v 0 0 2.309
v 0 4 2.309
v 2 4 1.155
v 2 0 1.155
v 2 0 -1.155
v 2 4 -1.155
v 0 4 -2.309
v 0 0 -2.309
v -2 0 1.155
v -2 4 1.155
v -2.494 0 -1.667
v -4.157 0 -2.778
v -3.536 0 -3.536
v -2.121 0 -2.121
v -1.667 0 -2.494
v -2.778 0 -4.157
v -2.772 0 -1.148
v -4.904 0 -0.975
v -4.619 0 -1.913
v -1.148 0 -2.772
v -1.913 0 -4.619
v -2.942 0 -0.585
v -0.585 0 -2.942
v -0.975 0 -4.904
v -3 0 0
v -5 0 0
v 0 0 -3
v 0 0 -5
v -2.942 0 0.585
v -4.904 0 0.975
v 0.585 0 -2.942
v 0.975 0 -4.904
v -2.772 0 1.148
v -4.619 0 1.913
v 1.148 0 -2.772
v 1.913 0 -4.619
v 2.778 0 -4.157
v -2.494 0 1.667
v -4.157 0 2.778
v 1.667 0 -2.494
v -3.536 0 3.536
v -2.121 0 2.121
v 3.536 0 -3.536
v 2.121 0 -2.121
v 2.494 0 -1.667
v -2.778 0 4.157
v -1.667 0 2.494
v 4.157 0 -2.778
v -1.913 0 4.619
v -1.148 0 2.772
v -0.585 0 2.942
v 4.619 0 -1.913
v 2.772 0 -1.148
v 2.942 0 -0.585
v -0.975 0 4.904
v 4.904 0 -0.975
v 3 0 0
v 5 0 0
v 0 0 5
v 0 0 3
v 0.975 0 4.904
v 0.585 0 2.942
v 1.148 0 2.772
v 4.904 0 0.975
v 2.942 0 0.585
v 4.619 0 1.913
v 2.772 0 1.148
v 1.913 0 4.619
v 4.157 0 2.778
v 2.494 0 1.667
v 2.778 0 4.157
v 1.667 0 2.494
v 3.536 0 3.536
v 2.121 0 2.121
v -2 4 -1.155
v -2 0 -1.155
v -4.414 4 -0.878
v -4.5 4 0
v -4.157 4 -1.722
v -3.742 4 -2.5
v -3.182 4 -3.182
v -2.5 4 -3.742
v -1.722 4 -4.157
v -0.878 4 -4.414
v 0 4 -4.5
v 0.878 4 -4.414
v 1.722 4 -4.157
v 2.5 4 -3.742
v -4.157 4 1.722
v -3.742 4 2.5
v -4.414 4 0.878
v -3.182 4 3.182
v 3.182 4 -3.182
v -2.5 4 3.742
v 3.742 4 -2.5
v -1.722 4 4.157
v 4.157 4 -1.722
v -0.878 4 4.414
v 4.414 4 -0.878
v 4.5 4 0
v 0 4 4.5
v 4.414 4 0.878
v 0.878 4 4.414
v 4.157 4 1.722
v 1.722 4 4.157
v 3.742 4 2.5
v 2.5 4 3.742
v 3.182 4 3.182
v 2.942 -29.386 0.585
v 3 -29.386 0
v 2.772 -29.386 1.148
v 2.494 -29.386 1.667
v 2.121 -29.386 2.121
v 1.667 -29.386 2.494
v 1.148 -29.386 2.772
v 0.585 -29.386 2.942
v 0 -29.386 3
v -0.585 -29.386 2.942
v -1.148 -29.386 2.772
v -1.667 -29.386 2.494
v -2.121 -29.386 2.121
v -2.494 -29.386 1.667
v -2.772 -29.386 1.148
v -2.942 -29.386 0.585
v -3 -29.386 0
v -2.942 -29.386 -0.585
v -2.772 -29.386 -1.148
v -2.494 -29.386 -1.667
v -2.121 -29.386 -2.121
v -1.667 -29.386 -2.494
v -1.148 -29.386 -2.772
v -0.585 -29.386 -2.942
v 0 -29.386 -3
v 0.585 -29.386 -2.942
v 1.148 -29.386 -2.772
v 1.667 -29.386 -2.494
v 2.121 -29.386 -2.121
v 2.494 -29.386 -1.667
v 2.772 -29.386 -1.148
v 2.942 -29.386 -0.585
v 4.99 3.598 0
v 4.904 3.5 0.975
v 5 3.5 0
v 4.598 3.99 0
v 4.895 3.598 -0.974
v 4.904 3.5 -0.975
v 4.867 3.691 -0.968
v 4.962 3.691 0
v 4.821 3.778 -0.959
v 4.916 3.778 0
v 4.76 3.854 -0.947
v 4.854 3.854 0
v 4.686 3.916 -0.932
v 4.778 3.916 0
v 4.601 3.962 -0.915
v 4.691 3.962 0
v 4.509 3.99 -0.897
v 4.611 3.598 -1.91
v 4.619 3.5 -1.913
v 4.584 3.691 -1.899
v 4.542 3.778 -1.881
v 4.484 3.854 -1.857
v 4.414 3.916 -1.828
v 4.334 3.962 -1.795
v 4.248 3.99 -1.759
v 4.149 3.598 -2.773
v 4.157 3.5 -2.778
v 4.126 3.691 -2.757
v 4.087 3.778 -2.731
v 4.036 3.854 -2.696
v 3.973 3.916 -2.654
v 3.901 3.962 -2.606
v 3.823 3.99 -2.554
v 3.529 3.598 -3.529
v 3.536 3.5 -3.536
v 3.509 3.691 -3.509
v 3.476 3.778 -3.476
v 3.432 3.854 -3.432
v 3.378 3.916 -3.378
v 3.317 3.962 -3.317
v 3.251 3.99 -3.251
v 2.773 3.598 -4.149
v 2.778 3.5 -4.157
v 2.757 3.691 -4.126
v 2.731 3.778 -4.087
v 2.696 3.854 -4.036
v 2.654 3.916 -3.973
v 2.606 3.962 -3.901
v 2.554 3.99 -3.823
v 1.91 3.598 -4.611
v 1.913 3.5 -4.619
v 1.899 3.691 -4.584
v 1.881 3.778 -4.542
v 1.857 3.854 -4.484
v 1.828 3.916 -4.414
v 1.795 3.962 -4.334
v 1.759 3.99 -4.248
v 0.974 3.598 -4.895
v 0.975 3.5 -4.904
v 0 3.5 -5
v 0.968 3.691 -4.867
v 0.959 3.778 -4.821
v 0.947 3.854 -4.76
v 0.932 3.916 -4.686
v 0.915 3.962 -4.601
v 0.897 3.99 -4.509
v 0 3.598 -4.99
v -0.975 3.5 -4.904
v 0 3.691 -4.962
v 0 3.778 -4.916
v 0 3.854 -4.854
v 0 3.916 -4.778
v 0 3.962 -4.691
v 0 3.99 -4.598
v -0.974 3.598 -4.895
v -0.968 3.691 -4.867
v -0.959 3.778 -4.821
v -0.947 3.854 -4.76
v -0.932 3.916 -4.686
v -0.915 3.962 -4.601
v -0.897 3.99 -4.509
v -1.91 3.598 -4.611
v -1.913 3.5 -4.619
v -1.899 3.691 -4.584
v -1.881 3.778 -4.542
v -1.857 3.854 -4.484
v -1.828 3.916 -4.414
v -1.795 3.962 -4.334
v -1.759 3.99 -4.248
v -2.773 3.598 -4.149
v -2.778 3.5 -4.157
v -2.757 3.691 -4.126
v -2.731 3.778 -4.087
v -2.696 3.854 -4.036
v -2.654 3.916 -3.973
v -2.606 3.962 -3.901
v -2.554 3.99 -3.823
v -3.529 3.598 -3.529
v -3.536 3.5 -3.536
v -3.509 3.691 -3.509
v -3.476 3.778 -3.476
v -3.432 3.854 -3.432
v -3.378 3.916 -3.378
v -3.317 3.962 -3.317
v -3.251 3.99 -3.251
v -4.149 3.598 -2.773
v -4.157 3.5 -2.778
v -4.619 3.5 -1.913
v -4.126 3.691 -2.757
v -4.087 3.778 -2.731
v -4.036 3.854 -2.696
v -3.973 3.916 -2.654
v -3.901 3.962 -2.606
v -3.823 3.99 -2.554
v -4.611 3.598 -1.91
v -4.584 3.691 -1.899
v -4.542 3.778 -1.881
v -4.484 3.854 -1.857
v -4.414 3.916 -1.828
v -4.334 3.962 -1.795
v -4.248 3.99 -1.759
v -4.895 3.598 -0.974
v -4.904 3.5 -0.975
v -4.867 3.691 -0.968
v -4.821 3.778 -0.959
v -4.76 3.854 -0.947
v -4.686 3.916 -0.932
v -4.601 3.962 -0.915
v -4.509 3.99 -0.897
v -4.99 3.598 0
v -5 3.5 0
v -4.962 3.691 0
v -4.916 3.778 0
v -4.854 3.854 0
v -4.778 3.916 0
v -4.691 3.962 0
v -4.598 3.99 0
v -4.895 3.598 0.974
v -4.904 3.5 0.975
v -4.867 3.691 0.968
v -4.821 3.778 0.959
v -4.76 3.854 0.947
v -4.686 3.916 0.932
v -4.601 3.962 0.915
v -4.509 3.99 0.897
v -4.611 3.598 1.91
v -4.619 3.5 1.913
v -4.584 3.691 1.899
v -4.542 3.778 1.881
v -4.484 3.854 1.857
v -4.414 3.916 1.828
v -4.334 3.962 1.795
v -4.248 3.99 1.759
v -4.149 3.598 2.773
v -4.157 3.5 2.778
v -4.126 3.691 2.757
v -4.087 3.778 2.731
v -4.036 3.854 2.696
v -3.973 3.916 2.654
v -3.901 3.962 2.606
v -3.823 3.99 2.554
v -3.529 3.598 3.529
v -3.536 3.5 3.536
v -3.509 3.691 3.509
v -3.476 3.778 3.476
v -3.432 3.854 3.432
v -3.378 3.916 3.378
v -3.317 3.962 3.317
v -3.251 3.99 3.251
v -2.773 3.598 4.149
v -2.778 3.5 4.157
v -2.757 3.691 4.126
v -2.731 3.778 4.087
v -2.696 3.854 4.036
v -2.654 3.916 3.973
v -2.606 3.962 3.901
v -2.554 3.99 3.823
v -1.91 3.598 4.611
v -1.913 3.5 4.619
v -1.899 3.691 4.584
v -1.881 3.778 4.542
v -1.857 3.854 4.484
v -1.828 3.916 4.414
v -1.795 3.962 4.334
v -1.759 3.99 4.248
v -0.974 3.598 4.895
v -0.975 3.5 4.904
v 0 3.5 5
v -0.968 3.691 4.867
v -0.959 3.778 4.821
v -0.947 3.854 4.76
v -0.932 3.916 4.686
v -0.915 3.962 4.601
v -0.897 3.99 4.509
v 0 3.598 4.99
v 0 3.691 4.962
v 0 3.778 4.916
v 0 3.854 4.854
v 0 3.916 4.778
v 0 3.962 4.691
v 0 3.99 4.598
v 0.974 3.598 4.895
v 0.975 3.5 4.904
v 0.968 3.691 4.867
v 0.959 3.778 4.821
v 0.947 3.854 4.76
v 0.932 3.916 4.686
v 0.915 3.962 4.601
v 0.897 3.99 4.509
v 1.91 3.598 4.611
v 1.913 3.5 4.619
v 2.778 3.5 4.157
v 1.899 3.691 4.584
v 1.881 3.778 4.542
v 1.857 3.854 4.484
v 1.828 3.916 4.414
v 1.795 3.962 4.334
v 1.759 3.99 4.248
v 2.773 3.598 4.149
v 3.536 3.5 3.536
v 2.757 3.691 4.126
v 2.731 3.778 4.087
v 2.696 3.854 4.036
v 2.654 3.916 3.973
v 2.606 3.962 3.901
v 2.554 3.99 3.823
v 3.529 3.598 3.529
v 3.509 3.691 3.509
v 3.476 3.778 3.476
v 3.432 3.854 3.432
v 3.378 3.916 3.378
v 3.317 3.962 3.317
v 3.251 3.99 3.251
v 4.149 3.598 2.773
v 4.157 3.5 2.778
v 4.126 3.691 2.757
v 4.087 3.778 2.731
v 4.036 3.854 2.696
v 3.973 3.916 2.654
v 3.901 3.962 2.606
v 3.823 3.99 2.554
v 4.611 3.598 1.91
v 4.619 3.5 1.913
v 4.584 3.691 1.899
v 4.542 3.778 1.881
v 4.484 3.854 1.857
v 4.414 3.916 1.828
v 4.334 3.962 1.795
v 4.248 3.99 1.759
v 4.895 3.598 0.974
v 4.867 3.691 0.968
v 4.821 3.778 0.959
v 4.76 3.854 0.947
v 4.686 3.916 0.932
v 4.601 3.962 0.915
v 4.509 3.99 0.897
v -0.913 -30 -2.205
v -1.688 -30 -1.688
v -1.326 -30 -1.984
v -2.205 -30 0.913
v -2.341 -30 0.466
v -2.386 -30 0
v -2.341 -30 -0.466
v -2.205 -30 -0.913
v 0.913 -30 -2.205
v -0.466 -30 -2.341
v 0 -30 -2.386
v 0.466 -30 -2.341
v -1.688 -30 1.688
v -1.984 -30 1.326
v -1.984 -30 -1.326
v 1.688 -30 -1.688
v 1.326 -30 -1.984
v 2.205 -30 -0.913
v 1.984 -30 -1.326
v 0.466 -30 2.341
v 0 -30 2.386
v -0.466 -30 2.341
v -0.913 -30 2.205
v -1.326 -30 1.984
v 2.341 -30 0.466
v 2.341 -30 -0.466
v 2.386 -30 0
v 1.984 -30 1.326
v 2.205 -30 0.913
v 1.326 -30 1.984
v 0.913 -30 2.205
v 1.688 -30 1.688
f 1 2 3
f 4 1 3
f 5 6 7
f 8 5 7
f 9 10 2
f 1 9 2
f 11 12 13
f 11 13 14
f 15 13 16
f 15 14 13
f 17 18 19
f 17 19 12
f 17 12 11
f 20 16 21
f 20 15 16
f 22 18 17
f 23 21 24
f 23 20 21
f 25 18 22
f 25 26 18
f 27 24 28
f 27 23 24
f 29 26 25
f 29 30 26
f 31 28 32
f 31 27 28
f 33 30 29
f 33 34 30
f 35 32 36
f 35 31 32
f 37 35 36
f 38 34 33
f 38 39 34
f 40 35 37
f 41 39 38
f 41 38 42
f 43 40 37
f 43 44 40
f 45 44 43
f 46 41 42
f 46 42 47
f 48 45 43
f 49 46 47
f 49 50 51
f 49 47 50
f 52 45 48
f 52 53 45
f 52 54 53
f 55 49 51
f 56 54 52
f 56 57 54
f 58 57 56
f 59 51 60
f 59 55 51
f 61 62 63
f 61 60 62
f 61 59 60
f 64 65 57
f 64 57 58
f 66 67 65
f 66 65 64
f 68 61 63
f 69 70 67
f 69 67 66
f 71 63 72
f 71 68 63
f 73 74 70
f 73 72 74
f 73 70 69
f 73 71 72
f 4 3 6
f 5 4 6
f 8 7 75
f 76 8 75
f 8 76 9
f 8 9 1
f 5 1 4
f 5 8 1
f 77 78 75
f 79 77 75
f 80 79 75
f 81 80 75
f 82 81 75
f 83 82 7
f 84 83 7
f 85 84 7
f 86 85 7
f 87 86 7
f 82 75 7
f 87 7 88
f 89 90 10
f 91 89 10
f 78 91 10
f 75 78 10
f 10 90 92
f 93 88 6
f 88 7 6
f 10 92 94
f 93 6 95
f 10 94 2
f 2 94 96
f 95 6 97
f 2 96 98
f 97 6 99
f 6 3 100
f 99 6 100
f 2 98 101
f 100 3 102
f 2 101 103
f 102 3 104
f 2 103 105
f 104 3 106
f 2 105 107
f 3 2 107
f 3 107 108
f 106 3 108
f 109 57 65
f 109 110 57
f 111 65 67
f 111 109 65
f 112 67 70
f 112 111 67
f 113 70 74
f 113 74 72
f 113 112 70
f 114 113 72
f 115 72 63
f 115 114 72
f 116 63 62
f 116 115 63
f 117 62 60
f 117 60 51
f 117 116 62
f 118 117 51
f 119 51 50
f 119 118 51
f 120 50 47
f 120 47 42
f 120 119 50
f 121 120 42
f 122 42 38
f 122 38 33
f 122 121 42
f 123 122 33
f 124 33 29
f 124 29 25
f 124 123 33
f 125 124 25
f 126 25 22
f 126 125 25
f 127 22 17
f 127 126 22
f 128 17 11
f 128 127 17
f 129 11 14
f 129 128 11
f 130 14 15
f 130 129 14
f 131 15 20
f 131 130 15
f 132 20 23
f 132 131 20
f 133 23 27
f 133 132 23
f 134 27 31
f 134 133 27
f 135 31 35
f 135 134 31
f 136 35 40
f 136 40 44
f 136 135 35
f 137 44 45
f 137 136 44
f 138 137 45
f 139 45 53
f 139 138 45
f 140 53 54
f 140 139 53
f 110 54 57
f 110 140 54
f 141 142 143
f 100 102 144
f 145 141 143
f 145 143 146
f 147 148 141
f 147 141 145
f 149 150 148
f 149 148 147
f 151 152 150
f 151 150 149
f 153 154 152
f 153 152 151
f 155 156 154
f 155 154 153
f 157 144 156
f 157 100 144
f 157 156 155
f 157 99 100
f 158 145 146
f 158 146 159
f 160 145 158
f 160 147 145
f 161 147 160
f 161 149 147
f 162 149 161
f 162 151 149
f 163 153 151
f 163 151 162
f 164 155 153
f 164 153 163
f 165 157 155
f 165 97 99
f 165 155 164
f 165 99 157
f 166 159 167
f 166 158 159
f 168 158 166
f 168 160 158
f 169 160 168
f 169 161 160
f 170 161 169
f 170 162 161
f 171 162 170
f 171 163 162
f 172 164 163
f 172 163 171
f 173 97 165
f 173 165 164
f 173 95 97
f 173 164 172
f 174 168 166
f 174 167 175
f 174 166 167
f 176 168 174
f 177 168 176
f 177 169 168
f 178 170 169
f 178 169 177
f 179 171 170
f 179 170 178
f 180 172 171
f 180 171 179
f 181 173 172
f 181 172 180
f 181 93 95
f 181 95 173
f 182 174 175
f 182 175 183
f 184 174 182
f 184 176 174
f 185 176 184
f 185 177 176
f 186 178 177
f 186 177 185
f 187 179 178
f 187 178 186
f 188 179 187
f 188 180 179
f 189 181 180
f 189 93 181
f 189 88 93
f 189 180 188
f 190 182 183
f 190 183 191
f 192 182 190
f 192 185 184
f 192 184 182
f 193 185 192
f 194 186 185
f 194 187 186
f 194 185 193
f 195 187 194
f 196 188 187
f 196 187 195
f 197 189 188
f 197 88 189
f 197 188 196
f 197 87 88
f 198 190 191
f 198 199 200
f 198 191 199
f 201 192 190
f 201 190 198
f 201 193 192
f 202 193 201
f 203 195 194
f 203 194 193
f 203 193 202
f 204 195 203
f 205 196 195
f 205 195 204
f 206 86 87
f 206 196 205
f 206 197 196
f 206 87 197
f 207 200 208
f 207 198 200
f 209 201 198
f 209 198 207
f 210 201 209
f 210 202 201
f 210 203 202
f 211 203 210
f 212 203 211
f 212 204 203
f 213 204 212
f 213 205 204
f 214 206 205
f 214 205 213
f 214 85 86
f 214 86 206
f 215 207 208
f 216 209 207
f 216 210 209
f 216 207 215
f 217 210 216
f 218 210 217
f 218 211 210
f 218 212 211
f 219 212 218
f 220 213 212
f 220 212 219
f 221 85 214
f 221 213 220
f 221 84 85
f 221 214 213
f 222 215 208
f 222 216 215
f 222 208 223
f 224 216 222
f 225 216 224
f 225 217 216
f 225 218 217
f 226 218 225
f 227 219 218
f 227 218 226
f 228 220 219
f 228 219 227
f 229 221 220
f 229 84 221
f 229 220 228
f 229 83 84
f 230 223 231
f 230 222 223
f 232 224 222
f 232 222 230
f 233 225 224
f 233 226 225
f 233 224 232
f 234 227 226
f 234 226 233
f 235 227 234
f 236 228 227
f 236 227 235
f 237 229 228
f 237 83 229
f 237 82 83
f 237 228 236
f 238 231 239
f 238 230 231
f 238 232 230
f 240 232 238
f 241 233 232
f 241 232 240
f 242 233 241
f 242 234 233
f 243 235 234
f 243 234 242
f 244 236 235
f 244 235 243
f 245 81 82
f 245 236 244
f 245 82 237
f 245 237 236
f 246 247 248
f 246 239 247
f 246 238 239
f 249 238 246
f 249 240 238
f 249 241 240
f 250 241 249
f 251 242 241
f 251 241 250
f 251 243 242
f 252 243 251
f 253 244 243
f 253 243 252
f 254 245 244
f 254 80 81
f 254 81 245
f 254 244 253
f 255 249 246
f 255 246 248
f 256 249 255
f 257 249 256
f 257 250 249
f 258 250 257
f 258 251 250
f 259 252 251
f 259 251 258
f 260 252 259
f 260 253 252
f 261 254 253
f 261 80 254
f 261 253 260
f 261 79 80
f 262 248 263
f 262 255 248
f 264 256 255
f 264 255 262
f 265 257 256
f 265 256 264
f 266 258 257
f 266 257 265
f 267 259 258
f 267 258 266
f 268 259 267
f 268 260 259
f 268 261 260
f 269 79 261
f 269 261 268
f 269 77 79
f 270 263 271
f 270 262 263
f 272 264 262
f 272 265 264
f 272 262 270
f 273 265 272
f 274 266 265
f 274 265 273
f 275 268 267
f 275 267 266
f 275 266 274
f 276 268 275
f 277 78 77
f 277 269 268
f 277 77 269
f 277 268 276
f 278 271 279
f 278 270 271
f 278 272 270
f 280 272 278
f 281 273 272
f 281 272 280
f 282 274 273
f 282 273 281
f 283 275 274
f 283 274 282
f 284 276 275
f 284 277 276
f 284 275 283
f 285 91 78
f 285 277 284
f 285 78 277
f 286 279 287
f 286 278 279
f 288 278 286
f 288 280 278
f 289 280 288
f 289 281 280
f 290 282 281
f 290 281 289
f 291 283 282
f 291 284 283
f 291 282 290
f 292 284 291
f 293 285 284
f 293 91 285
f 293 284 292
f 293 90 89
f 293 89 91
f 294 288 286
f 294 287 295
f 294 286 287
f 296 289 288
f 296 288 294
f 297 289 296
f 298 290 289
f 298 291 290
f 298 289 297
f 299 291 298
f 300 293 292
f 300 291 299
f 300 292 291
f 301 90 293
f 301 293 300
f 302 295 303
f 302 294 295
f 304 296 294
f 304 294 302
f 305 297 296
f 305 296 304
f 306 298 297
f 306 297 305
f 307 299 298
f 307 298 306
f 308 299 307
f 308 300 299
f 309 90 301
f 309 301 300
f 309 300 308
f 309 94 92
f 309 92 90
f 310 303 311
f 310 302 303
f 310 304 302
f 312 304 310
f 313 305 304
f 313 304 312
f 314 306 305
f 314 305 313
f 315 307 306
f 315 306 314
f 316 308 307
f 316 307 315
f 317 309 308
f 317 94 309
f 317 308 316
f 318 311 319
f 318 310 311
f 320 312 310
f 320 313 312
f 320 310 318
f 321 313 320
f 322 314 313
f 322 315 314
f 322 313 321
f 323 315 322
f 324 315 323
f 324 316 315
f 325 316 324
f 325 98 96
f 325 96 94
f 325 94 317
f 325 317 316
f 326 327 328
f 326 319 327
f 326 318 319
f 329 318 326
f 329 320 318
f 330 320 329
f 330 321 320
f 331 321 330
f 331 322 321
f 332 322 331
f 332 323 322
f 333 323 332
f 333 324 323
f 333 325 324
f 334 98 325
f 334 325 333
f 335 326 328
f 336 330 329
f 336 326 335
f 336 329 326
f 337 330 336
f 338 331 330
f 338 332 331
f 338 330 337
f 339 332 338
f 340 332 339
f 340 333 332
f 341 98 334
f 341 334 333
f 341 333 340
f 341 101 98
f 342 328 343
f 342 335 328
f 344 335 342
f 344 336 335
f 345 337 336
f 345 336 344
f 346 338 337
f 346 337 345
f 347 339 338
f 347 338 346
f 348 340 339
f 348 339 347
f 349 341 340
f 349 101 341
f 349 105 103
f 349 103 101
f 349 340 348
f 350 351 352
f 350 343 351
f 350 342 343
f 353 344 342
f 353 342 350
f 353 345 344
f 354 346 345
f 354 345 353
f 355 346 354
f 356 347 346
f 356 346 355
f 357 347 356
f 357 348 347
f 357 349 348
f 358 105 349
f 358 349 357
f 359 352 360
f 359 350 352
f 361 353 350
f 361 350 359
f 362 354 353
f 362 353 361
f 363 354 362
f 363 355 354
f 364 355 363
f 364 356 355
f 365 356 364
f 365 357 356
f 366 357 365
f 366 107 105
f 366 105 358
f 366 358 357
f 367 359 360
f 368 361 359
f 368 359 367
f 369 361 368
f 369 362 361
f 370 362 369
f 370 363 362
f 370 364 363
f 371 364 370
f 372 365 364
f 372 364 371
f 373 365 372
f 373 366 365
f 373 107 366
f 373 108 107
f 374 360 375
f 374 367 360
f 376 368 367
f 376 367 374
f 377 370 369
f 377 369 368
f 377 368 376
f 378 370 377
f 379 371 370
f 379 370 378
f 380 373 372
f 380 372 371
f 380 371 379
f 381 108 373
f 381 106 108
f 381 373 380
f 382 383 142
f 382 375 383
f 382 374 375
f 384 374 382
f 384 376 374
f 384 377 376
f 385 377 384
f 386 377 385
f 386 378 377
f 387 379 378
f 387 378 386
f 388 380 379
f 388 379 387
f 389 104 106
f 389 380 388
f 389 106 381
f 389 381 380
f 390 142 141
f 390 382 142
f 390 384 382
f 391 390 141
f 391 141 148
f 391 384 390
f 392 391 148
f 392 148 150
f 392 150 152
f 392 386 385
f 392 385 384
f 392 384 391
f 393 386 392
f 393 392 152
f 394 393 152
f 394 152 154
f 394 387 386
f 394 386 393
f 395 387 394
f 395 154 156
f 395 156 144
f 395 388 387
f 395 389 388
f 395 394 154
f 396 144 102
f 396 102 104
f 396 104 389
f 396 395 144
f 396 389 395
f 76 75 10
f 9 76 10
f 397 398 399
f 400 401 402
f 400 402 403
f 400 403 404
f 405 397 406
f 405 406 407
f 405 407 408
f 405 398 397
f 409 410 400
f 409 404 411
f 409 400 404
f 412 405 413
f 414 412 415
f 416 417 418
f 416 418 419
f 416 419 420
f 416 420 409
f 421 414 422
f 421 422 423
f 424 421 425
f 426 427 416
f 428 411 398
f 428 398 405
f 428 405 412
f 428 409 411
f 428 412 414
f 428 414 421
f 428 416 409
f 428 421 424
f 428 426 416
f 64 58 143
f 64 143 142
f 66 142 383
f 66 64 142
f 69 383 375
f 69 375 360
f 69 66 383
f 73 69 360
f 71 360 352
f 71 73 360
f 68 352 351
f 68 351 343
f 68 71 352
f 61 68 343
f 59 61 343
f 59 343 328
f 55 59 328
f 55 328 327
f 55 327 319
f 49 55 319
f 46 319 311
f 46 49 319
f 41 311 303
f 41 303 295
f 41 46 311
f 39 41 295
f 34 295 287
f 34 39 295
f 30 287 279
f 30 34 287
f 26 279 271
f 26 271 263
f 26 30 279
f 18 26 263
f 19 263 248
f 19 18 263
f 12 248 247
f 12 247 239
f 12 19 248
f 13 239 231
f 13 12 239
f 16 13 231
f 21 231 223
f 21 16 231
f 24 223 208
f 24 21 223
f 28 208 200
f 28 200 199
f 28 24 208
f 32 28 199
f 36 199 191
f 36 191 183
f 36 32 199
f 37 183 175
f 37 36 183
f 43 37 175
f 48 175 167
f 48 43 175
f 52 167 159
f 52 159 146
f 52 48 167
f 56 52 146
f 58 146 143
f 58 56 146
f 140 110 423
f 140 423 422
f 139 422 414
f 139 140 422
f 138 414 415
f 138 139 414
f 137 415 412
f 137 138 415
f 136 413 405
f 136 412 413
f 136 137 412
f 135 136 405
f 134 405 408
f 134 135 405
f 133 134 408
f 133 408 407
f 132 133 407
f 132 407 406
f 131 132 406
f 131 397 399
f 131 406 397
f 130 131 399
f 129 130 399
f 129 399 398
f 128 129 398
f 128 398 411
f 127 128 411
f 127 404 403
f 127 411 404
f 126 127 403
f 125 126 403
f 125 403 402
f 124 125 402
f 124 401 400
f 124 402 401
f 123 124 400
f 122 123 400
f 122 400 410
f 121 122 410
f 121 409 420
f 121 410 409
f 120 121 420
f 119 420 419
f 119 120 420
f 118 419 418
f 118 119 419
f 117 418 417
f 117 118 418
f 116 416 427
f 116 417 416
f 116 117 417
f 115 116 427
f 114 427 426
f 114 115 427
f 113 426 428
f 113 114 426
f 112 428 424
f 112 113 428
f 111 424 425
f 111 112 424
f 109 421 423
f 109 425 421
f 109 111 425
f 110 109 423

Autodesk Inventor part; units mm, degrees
ref_plane "Deaktiviert_NICHT_mehrverwenden_Zyl__Schraube_DIN_EN_ISO_4762_XY" through (0, 0, 0) normal (0, 1, 0) x (1, 0, 0)
ref_plane "Deaktiviert_NICHT_mehrverwenden_Zyl__Schraube_DIN_EN_ISO_4762_YZ" through (0, 0, 0) normal (1, 0, 0) x (0, 0, -1)
ref_plane "Deaktiviert_NICHT_mehrverwenden_Zyl__Schraube_DIN_EN_ISO_4762_ZX" through (0, 0, 0) normal (0, 0, -1) x (0, 1, 0)
sketch "Skizze_1" plane through (0, 0, 0) normal (0, 0, 1) x (1, 0, 0)
  line L0 (0, -30) -> (0, 0)
  line L1 (0, 0) -> (3, 0)
  line L2 (3, 0) -> (3, -29.3865)
  line L3 (3, -29.3865) -> (2.3865, -30)
  line L4 (2.3865, -30) -> (0, -30)
  line L5 (0, -30) -> (0, 0)
revolve "Revolution1" add sketch "Skizze_1" angle 360 about axis through (0, -30, 0) along (0, -1, 0)
thread "Thread1" size "M6x1" class "6g" standard "ISO Metric profile" length 19.3865
sketch "Skizze_2" plane through (0, 0, 0) normal (0, 0, 1) x (1, 0, 0)
  line L0 (0, 0) -> (0, 4)
  line L1 (0, 4) -> (4.5, 4)
  arc A0 (5, 3.5) -> (4.5, 4) centre (4.5, 3.5) ccw
  line L2 (5, 3.5) -> (5, 0)
  line L3 (5, 0) -> (0, 0)
  line L4 (0, 0) -> (0, 4)
revolve "Revolution2" add sketch "Skizze_2" angle 360 about axis through (0, 0, 0) along (0, -1, 0)
sketch "Skizze_3" plane through (0, 4, 0) normal (0, 1, 0) x (1, 0, 0)
  line L0 (-2, -1.1547) -> (0, -2.3094)
  line L1 (0, -2.3094) -> (2, -1.1547)
  line L2 (2, -1.1547) -> (2, 1.1547)
  line L3 (2, 1.1547) -> (0, 2.3094)
  line L4 (0, 2.3094) -> (-2, 1.1547)
  line L5 (-2, 1.1547) -> (-2, -1.1547)
extrude "Extrusion1" cut sketch "Skizze_3" against normal blind 4
ref_plane "EP_XY" through (0, 0, 0) normal (0, 1, 0) x (1, 0, 0)
ref_plane "EP_YZ" through (0, 0, 0) normal (1, 0, 0) x (0, 0, -1)
ref_plane "EP_ZX" through (0, 0, 0) normal (0, 0, -1) x (0, 1, 0)
ref_plane "EP_Schraube_XY" through (0, 0, 0) normal (0, 1, 0) x (1, 0, 0)
ref_plane "EP_Schraube_YZ" through (0, 0, 0) normal (1, 0, 0) x (0, 0, -1)
ref_plane "EP_Schraube_ZX" through (0, 0, 0) normal (0, 0, -1) x (0, 1, 0)
properties part number "Zyl.Schr-M6x30_Stahl_X094085"
